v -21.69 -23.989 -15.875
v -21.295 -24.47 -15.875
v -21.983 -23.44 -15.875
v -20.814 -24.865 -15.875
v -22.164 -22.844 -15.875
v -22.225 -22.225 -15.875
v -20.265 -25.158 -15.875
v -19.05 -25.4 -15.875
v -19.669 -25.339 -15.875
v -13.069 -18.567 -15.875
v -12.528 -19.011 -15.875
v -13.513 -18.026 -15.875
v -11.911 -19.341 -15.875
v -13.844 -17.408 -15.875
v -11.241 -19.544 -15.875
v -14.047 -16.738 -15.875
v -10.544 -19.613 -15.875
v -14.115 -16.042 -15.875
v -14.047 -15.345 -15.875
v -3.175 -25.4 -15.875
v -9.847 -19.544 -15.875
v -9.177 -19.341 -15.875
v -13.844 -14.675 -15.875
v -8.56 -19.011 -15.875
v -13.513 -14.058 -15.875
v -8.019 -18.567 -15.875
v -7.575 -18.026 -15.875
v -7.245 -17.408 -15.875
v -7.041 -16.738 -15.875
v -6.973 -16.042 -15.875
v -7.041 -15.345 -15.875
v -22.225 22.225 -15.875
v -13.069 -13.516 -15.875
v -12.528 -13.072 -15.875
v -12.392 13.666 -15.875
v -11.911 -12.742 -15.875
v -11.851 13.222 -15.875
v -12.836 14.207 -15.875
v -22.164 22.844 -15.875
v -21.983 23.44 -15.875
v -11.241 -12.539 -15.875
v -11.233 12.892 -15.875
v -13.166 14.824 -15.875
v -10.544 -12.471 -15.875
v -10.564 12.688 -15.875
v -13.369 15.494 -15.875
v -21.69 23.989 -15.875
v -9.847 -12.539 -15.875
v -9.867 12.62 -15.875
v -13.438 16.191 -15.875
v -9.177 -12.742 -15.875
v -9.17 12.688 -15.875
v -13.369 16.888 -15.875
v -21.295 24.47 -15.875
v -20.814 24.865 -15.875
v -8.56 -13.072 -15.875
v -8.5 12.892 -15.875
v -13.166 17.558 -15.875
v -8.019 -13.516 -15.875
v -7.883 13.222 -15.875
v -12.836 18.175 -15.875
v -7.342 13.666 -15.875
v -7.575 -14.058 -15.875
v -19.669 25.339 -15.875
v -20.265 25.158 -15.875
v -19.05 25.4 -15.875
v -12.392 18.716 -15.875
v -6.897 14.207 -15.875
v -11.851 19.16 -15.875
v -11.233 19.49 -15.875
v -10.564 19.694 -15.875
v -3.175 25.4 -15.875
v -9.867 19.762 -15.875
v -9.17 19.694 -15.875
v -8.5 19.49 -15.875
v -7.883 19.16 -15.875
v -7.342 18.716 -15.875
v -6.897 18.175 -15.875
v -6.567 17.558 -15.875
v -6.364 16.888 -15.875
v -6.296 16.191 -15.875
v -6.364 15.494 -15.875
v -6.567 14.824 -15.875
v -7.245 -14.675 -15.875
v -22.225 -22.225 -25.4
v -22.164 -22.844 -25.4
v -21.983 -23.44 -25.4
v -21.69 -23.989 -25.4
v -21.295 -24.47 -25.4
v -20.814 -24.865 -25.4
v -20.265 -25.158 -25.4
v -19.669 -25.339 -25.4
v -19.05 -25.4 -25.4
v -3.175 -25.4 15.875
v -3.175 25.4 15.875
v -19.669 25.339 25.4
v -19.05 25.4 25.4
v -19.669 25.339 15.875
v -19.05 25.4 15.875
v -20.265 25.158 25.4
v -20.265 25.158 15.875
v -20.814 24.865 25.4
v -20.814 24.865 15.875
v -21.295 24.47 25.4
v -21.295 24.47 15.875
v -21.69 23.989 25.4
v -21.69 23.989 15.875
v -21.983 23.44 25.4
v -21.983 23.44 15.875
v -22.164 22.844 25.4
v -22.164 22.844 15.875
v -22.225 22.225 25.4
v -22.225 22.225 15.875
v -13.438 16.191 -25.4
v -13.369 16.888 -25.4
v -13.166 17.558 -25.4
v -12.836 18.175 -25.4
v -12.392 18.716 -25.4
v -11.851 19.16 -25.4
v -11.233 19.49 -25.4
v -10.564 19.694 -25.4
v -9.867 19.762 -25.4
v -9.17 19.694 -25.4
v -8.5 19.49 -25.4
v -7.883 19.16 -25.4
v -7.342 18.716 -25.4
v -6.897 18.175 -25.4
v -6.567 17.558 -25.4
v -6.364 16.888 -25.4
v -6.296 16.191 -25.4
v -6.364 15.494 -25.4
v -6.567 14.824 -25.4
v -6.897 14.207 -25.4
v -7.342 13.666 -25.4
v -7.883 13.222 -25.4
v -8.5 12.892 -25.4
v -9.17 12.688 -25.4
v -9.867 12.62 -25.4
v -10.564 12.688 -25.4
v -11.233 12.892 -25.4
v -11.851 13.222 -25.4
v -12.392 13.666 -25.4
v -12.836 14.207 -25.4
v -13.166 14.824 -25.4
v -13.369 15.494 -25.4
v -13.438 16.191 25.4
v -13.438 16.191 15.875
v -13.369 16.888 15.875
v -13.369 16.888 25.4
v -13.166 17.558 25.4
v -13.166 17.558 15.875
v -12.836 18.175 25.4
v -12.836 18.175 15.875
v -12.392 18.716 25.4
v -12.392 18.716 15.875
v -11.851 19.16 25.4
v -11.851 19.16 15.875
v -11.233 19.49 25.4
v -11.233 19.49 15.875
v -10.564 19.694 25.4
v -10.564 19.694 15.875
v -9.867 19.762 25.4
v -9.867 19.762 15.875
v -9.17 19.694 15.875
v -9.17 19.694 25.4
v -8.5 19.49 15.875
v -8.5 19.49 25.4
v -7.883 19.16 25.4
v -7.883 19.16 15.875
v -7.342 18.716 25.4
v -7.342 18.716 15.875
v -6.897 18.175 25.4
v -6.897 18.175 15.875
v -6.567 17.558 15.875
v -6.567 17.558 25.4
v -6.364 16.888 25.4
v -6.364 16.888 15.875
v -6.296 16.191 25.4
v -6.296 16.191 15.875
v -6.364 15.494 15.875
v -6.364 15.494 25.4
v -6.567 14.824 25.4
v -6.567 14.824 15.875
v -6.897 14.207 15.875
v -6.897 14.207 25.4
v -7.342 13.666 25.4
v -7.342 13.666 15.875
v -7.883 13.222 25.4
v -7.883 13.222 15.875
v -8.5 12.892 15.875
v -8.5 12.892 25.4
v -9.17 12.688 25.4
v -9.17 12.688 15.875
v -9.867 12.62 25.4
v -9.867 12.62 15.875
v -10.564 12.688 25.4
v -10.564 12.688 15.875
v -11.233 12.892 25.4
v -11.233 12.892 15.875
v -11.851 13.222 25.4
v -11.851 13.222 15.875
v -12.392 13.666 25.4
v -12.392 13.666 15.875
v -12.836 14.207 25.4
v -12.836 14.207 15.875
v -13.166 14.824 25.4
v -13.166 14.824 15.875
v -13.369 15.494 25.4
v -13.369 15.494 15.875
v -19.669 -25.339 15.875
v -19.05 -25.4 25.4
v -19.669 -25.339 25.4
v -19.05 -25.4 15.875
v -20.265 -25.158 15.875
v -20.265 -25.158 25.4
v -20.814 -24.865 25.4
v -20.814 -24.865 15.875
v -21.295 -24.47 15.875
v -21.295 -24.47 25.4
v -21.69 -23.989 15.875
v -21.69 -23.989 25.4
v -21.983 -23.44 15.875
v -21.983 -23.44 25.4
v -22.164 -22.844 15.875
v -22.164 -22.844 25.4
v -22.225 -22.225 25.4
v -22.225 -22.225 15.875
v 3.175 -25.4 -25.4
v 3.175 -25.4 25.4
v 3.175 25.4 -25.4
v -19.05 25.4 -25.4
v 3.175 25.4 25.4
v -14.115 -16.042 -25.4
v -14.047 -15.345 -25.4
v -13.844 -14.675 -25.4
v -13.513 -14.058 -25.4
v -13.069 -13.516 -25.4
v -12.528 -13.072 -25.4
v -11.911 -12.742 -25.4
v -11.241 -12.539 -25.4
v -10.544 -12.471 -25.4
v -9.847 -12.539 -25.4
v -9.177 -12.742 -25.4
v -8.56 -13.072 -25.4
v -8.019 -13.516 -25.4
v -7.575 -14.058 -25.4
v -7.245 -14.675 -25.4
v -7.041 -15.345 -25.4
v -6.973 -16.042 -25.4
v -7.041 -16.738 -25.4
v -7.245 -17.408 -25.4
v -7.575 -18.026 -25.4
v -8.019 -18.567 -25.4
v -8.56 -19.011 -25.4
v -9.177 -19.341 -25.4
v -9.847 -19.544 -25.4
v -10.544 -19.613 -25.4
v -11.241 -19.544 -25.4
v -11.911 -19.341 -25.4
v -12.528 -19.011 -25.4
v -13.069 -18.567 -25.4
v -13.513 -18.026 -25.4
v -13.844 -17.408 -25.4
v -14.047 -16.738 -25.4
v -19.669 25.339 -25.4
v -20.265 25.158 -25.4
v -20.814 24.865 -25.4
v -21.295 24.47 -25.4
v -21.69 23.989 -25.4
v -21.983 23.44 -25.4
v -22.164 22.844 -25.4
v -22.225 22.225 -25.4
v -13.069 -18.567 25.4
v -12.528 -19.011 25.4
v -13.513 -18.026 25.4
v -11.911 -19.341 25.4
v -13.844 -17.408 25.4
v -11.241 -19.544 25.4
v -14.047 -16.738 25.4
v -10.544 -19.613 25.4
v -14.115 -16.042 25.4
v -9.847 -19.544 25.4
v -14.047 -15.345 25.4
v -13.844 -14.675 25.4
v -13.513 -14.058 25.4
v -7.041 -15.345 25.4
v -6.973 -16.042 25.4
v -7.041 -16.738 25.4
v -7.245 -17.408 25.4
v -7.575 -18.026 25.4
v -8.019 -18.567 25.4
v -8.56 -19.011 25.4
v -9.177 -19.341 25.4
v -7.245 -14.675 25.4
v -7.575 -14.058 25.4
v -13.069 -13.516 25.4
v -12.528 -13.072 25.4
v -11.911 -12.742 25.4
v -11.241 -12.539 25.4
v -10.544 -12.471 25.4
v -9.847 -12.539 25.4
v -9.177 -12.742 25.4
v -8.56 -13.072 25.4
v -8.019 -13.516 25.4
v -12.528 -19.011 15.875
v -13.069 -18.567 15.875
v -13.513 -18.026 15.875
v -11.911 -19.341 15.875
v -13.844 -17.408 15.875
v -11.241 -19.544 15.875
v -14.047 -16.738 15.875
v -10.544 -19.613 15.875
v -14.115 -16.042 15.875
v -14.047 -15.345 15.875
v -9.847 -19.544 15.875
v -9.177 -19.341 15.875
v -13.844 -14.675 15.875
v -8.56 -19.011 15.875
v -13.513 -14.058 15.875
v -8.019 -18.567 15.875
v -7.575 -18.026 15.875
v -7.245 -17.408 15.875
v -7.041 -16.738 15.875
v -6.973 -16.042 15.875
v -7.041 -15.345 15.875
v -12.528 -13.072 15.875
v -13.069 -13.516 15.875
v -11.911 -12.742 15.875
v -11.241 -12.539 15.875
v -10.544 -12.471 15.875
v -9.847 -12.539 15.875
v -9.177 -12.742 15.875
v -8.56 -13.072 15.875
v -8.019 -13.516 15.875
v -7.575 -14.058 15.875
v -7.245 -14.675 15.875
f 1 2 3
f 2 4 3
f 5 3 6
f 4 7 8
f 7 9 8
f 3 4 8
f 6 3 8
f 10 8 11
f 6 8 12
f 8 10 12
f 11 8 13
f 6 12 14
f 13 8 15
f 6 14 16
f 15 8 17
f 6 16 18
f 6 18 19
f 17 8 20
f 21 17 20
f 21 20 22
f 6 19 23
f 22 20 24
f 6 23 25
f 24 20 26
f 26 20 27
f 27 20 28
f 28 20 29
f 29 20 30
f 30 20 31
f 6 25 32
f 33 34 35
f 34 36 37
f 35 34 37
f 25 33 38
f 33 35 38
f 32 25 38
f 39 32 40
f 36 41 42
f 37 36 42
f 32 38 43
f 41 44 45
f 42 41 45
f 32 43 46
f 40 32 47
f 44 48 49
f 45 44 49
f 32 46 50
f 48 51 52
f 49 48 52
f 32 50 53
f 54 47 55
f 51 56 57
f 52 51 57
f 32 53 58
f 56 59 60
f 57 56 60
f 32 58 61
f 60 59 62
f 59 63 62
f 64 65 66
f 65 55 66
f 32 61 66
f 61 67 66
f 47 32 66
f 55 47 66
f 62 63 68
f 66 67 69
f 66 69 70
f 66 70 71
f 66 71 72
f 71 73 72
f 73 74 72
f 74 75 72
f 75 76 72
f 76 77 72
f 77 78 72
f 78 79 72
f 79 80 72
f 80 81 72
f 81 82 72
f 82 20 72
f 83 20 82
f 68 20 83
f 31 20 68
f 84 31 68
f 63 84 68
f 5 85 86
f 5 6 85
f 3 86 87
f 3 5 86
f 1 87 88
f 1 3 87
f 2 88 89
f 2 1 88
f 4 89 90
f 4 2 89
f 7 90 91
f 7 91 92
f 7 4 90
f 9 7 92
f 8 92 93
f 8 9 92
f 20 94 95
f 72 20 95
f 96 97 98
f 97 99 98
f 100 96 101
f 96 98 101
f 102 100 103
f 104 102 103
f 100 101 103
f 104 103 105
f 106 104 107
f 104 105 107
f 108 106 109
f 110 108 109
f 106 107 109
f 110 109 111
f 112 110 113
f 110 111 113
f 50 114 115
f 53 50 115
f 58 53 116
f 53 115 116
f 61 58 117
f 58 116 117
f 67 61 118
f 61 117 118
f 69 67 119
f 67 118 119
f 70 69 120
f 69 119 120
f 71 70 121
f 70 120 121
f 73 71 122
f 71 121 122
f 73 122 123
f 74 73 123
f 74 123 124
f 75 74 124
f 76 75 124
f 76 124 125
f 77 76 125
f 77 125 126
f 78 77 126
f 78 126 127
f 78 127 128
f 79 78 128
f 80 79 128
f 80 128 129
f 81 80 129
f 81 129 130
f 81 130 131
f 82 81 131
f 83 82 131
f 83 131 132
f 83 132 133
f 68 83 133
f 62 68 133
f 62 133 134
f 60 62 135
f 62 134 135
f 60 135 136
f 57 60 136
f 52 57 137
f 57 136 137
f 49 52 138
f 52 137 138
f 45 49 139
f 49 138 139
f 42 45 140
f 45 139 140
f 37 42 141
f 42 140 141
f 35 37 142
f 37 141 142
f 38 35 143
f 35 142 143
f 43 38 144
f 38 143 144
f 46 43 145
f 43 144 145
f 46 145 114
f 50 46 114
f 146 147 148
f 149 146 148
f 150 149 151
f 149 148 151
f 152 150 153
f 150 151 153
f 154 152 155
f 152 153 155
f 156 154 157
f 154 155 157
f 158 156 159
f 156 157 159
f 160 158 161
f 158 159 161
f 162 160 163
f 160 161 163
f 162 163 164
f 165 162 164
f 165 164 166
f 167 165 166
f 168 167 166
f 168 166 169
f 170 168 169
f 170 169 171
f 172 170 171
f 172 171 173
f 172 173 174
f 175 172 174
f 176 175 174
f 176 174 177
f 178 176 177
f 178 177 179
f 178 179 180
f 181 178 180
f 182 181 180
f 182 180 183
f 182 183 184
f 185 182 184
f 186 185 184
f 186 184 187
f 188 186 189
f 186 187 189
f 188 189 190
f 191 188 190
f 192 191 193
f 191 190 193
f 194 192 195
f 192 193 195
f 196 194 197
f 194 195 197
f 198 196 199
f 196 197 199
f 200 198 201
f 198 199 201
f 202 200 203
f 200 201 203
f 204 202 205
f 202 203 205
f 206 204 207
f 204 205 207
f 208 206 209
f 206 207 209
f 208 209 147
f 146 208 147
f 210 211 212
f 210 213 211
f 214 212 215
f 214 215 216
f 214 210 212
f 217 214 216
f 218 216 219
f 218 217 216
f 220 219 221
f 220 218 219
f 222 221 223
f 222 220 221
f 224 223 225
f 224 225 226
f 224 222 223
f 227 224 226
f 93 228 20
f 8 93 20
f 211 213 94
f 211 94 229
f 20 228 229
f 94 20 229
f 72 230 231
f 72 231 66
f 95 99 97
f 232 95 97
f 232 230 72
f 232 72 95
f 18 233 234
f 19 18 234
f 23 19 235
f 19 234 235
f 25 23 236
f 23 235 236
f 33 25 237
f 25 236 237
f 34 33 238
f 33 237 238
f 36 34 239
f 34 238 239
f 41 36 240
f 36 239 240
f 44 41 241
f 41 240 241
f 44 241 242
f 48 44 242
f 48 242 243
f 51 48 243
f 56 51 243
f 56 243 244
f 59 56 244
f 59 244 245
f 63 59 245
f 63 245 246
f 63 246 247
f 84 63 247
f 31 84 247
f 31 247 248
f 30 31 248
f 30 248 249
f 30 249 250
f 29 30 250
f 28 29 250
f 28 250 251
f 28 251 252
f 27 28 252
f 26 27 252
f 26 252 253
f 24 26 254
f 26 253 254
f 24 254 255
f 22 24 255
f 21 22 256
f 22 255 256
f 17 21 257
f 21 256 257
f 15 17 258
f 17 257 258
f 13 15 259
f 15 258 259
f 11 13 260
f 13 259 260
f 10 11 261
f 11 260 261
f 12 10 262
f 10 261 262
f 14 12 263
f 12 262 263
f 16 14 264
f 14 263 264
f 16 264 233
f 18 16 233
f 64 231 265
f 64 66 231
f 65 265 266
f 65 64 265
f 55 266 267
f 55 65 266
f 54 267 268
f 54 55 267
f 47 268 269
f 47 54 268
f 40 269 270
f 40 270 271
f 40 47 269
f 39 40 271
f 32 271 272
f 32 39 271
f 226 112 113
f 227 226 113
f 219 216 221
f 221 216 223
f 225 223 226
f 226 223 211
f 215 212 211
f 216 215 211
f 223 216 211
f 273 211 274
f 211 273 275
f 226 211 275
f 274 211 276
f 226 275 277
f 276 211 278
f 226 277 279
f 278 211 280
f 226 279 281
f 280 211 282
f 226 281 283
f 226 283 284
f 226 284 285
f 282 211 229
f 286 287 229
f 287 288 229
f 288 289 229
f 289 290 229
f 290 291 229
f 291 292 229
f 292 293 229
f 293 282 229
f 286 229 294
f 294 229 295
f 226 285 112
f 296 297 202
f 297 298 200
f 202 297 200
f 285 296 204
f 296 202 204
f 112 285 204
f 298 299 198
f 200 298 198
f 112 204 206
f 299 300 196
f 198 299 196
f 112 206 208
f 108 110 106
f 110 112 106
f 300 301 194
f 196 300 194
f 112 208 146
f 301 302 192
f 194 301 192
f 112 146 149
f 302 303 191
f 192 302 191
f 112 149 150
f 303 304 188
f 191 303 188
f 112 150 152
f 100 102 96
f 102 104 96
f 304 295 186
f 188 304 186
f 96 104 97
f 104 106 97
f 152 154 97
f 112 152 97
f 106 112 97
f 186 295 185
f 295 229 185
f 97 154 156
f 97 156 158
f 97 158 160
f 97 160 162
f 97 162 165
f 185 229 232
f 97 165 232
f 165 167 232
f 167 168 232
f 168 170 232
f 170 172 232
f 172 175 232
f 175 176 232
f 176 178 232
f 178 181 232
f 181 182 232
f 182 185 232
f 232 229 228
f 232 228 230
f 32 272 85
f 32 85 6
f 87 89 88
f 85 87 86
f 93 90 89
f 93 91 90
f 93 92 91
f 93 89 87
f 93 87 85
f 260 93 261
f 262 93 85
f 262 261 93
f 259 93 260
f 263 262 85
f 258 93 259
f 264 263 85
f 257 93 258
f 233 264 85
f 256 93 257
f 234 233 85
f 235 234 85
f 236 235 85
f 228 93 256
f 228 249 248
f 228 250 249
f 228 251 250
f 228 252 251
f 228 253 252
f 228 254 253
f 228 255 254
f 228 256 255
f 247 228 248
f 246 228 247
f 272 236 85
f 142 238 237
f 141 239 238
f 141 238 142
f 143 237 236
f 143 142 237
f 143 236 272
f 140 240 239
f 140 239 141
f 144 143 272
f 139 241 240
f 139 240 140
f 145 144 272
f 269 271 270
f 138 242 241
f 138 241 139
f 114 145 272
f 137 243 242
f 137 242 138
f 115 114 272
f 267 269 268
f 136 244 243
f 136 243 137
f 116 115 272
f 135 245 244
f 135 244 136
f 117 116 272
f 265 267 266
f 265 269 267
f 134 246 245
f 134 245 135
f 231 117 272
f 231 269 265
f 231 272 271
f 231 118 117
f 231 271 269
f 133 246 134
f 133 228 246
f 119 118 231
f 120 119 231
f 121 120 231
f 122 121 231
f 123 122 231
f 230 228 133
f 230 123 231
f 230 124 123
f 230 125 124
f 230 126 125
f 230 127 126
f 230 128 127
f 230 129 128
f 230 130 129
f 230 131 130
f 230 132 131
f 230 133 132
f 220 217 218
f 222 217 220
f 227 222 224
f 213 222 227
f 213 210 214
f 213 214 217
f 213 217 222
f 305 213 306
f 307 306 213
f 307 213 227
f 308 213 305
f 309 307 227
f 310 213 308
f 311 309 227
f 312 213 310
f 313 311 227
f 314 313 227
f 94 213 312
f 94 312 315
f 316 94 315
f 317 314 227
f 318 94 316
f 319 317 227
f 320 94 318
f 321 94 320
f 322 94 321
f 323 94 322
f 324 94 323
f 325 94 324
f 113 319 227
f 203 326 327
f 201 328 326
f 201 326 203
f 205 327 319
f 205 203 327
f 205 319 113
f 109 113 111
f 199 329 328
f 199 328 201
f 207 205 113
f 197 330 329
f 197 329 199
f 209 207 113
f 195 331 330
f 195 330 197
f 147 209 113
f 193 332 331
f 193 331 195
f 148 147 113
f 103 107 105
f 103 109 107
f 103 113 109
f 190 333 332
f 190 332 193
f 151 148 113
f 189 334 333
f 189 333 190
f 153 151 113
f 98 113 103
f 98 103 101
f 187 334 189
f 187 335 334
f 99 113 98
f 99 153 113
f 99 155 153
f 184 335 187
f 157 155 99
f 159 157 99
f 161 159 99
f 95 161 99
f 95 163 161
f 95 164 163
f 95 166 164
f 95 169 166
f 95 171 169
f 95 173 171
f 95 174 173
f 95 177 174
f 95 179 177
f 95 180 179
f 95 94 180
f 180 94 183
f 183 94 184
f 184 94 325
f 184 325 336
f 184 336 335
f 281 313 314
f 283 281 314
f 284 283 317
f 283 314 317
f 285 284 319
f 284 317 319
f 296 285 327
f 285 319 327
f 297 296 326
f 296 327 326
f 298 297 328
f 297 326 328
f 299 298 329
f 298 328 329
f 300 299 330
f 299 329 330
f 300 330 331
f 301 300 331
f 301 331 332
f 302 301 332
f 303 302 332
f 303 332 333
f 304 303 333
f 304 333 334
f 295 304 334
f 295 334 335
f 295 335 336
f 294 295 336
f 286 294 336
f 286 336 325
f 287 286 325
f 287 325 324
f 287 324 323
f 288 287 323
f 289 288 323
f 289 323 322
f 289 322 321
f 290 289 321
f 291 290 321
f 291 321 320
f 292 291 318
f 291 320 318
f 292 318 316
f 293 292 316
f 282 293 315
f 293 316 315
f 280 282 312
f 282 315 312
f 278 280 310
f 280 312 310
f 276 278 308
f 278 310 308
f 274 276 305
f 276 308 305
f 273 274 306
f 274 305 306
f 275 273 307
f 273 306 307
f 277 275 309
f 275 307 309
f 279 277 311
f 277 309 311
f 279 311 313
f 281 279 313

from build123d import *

# Parameters (mm, degrees)
SKETCH1_W               = 25.4
SKETCH1_H               = 50.8
BOSS_EXTRUDE1_DEPTH     = 3.175
SKETCH4_W               = 6.35
SKETCH4_H               = 50.8
BOSS_EXTRUDE2_DEPTH     = 12.7
SKETCH5_W               = 9.525
SKETCH5_H               = 50.8
BOSS_EXTRUDE3_DEPTH     = 25.4
F_1_4_CLEARANCE_HOLE1_D = 7.14248
FILLET1_R               = 3.175


with BuildPart() as part:
    # Sketch1 → Boss-Extrude1 (new, symmetric)
    with BuildSketch(Plane(origin=(0, 0, 0), x_dir=(0, 0, -1), z_dir=(1, 0, 0))):
        Rectangle(SKETCH1_W, SKETCH1_H)
    extrude(amount=BOSS_EXTRUDE1_DEPTH, both=True)

    # Sketch4 → Boss-Extrude2 (add)
    with BuildSketch(Plane.XY.offset(12.7)):
        Rectangle(SKETCH4_W, SKETCH4_H)
    boss_extrude2 = extrude(amount=BOSS_EXTRUDE2_DEPTH)

    # Sketch5 → Boss-Extrude3 (add)
    with BuildSketch(Plane(origin=(3.175, 0, 0), x_dir=(0, 0, -1), z_dir=(1, 0, 0))):
        with Locations((-20.6375, 0)):
            Rectangle(SKETCH5_W, SKETCH5_H)
    boss_extrude3 = extrude(amount=-BOSS_EXTRUDE3_DEPTH)

    # Mirror1: Boss-Extrude2, Boss-Extrude3 across plane
    add(boss_extrude2.mirror(Plane.XY))
    add(boss_extrude3.mirror(Plane.XY))

    # 1/4 Clearance Hole1 (through all)
    with Locations(Plane(origin=(-9.866844114, 16.191031899, 25.4), x_dir=(1, 0, 0), z_dir=(0, 0, 1))):
        with Locations((0, 0), (-0.677264826, -32.232776497)):
            Hole(F_1_4_CLEARANCE_HOLE1_D / 2)

    # Fillet1
    fillet1_edges = [part.edges().sort_by_distance(p)[0] for p in [
        (-22.225, 25.4, 20.6375),
        (-22.225, -25.4, 20.6375),
        (-22.225, -25.4, -20.6375),
        (-22.225, 25.4, -20.6375),
    ]]
    fillet(fillet1_edges, radius=FILLET1_R)


solid = part.part
